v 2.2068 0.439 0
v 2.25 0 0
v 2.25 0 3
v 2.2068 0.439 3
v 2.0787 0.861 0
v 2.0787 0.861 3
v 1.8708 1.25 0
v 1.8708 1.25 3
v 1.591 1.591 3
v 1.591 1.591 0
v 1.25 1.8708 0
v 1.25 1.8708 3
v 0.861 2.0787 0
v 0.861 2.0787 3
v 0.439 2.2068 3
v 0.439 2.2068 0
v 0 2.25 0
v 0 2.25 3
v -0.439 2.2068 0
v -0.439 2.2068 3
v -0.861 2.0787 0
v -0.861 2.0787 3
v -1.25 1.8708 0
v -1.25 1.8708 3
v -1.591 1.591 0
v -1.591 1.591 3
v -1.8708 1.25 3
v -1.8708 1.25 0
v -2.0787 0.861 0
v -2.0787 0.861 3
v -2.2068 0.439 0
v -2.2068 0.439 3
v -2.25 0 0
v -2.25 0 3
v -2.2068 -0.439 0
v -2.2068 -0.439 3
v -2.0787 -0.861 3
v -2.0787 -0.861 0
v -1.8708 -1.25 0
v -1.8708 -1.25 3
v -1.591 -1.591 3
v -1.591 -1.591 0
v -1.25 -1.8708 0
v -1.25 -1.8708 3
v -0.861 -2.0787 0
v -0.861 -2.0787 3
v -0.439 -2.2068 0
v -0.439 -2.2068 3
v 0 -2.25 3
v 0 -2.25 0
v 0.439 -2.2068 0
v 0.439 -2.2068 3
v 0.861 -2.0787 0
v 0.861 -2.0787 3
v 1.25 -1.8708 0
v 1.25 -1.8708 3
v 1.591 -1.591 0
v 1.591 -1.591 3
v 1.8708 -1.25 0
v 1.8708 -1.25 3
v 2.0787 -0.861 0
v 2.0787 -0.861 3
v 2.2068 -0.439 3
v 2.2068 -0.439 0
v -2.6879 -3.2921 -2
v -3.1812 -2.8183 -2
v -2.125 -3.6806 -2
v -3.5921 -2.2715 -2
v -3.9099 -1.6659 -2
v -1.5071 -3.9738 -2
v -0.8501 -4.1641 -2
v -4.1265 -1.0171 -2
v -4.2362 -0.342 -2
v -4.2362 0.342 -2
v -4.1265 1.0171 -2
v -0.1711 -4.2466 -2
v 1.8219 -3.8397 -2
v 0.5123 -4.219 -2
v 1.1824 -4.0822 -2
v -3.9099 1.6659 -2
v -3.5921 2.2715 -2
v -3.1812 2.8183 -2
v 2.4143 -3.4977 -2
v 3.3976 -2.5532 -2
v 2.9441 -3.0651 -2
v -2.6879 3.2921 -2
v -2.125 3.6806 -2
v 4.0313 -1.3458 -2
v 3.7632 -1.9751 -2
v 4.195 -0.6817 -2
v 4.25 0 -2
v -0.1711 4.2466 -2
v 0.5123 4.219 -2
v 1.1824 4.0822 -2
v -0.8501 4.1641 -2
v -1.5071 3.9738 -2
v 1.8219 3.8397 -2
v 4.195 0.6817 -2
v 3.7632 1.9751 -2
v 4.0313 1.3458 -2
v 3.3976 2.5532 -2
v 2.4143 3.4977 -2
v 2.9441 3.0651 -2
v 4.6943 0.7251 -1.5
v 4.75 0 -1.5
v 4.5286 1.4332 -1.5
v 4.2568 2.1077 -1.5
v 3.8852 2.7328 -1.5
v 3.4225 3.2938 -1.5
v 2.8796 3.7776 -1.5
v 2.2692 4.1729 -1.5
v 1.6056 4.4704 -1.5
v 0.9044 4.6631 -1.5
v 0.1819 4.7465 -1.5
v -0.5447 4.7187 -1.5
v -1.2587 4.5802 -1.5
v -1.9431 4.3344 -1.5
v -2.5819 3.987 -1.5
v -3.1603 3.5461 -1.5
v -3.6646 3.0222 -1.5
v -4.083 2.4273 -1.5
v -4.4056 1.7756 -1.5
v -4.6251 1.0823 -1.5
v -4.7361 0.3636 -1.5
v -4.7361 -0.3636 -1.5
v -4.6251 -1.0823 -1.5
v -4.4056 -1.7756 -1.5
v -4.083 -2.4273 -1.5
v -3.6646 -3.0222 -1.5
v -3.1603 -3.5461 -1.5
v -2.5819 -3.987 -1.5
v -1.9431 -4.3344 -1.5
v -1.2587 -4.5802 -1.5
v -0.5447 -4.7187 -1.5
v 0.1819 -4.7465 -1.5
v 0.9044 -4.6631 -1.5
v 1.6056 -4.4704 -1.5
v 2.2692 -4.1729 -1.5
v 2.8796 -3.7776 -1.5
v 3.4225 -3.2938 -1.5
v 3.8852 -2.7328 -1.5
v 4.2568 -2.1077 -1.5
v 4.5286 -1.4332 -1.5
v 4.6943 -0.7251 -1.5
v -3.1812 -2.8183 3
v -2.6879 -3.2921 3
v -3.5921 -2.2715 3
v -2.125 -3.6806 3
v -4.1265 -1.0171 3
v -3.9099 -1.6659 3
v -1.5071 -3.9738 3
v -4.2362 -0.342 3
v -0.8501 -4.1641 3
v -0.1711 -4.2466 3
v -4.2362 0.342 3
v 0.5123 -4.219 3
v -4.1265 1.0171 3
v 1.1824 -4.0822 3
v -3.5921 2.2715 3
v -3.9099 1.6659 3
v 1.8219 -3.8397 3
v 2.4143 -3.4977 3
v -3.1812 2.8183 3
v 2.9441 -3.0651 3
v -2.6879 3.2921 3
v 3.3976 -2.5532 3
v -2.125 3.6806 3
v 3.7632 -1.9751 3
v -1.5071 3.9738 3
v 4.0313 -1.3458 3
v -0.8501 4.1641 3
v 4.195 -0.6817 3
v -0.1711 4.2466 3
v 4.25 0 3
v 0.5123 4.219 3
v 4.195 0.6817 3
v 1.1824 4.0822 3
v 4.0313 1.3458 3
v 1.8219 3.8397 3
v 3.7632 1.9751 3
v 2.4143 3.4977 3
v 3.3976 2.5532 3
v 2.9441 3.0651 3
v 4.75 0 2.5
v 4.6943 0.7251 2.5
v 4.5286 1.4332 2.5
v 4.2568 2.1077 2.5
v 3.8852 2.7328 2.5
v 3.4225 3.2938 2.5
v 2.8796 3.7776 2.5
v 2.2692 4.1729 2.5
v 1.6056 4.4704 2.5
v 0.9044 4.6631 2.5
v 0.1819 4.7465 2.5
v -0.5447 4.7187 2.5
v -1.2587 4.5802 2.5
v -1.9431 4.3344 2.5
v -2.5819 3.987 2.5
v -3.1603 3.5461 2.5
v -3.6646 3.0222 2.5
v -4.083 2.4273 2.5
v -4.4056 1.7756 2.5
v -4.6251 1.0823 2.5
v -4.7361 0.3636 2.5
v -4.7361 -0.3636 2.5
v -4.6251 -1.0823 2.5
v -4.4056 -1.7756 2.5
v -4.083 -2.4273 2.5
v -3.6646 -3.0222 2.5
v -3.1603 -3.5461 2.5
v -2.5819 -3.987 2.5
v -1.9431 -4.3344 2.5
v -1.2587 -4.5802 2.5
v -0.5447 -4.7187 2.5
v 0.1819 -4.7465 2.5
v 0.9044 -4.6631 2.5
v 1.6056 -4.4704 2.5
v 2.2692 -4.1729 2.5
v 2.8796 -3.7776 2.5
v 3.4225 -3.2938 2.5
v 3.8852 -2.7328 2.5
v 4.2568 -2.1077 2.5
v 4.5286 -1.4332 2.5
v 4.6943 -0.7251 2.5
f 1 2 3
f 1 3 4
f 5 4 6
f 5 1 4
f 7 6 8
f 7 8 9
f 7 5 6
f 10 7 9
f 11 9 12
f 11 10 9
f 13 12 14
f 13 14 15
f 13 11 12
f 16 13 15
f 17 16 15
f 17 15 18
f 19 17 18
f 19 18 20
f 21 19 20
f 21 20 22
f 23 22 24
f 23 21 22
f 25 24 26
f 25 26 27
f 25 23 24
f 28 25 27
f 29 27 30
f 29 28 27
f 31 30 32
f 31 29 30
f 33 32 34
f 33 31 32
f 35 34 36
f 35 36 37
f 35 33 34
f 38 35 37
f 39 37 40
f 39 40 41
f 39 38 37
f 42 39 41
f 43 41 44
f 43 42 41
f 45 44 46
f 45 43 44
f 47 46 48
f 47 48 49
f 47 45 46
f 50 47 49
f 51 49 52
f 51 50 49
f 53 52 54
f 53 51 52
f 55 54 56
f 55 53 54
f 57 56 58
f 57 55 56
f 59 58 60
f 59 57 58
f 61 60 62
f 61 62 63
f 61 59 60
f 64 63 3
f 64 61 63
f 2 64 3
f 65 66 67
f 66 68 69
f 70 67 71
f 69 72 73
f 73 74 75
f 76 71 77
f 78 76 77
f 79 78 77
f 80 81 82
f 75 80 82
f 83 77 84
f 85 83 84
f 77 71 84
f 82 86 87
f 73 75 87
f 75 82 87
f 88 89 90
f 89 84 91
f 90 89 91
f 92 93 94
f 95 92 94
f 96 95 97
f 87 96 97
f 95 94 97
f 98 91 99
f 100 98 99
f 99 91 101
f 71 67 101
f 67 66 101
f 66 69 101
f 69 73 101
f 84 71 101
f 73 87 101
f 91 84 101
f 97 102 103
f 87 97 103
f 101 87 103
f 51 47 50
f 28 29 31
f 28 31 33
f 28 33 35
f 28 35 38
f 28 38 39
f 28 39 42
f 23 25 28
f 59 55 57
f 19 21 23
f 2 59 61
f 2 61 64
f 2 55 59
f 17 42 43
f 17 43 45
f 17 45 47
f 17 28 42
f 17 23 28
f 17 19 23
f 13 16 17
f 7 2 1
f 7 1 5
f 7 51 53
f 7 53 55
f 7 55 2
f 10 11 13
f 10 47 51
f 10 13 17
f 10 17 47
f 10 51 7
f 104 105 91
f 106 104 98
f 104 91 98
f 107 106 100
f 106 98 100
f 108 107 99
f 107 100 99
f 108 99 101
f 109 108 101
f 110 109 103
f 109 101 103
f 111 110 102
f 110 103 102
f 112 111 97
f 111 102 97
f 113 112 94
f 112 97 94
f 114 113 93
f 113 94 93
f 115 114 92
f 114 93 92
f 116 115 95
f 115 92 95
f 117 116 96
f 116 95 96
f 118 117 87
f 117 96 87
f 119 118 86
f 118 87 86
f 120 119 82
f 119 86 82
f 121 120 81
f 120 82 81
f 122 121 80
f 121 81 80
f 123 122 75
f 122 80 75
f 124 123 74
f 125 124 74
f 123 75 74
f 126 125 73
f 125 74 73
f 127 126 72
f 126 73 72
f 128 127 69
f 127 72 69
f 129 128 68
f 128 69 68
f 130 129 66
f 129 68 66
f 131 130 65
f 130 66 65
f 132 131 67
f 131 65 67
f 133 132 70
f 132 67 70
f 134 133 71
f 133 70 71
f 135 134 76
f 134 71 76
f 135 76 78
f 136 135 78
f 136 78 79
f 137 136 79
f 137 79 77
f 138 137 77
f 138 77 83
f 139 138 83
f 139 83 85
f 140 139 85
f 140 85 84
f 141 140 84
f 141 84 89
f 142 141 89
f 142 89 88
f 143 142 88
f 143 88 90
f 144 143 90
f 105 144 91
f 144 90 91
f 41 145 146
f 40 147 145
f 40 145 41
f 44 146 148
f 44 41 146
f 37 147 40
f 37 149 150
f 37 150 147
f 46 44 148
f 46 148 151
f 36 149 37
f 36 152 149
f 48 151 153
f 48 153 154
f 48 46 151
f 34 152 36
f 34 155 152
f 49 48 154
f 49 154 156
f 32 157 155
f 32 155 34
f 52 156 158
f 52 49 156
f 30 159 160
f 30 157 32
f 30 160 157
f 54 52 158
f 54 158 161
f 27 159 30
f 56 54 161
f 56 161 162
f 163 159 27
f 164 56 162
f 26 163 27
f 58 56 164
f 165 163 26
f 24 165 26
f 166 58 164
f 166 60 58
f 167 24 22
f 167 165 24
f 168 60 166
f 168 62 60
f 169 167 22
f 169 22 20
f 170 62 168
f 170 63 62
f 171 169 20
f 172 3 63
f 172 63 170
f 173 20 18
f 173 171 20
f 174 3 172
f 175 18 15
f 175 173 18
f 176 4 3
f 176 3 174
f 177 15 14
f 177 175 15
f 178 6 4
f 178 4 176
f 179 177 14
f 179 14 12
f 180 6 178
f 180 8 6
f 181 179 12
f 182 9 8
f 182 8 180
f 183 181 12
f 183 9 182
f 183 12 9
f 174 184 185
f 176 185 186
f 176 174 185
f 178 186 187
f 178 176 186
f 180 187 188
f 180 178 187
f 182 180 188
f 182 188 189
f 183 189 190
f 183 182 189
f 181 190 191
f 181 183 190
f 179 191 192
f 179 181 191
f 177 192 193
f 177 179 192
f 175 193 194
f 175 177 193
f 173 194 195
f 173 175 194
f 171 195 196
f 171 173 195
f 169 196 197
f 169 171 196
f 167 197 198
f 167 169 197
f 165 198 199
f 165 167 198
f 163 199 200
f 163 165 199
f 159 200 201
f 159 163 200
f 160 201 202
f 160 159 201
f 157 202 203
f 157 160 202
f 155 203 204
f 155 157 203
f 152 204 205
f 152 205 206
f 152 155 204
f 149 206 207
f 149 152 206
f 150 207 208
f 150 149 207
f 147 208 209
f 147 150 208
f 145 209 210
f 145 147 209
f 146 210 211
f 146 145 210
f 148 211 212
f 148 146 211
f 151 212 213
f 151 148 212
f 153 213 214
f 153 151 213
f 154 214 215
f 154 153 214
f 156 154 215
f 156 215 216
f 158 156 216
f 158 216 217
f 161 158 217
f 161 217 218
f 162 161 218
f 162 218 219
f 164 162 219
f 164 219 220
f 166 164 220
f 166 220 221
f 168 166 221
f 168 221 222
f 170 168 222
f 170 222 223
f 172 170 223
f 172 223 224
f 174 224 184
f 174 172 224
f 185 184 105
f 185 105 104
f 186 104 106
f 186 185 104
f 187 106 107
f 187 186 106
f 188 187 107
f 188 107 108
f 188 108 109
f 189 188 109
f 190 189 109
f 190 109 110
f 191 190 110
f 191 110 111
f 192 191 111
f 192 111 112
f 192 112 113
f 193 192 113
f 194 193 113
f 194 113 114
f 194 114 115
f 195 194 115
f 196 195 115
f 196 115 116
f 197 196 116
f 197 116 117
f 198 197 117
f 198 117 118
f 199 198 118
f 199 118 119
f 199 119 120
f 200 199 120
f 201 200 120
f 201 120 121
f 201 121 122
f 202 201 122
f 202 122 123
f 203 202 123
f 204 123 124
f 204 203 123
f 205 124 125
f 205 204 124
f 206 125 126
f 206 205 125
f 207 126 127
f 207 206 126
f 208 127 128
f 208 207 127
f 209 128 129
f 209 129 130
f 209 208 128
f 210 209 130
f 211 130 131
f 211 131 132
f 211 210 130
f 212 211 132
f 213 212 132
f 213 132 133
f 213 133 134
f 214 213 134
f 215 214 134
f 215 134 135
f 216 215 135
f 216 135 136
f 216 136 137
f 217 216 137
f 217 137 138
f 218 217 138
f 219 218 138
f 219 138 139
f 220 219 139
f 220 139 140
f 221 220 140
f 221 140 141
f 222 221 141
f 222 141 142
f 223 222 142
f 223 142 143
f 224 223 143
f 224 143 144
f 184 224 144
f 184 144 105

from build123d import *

# Parameters (mm, degrees)
F0_R     = 4.75
F0_R_2   = 2.25
F1_DEPTH = 3
F2_DEPTH = 2
F3_SIZE  = 0.5


with BuildPart() as f1:
    # F0 (on Top) → F1 (new body)
    with BuildSketch(Plane.XY):
        Circle(F0_R)
        Circle(F0_R_2, mode=Mode.SUBTRACT)
    extrude(amount=F1_DEPTH)

    # F0 (on Top) → F2 (join)
    with BuildSketch(Plane.XY):
        Circle(F0_R)
        Circle(F0_R_2, mode=Mode.SUBTRACT)
        Circle(F0_R_2)
    extrude(amount=-F2_DEPTH)

    # F3
    f3_edges = [f1.edges().sort_by_distance(p)[0] for p in [
        (-4.75, 0, 3),
        (-4.75, 0, -2),
    ]]
    chamfer(f3_edges, length=F3_SIZE)


solid = f1.part
